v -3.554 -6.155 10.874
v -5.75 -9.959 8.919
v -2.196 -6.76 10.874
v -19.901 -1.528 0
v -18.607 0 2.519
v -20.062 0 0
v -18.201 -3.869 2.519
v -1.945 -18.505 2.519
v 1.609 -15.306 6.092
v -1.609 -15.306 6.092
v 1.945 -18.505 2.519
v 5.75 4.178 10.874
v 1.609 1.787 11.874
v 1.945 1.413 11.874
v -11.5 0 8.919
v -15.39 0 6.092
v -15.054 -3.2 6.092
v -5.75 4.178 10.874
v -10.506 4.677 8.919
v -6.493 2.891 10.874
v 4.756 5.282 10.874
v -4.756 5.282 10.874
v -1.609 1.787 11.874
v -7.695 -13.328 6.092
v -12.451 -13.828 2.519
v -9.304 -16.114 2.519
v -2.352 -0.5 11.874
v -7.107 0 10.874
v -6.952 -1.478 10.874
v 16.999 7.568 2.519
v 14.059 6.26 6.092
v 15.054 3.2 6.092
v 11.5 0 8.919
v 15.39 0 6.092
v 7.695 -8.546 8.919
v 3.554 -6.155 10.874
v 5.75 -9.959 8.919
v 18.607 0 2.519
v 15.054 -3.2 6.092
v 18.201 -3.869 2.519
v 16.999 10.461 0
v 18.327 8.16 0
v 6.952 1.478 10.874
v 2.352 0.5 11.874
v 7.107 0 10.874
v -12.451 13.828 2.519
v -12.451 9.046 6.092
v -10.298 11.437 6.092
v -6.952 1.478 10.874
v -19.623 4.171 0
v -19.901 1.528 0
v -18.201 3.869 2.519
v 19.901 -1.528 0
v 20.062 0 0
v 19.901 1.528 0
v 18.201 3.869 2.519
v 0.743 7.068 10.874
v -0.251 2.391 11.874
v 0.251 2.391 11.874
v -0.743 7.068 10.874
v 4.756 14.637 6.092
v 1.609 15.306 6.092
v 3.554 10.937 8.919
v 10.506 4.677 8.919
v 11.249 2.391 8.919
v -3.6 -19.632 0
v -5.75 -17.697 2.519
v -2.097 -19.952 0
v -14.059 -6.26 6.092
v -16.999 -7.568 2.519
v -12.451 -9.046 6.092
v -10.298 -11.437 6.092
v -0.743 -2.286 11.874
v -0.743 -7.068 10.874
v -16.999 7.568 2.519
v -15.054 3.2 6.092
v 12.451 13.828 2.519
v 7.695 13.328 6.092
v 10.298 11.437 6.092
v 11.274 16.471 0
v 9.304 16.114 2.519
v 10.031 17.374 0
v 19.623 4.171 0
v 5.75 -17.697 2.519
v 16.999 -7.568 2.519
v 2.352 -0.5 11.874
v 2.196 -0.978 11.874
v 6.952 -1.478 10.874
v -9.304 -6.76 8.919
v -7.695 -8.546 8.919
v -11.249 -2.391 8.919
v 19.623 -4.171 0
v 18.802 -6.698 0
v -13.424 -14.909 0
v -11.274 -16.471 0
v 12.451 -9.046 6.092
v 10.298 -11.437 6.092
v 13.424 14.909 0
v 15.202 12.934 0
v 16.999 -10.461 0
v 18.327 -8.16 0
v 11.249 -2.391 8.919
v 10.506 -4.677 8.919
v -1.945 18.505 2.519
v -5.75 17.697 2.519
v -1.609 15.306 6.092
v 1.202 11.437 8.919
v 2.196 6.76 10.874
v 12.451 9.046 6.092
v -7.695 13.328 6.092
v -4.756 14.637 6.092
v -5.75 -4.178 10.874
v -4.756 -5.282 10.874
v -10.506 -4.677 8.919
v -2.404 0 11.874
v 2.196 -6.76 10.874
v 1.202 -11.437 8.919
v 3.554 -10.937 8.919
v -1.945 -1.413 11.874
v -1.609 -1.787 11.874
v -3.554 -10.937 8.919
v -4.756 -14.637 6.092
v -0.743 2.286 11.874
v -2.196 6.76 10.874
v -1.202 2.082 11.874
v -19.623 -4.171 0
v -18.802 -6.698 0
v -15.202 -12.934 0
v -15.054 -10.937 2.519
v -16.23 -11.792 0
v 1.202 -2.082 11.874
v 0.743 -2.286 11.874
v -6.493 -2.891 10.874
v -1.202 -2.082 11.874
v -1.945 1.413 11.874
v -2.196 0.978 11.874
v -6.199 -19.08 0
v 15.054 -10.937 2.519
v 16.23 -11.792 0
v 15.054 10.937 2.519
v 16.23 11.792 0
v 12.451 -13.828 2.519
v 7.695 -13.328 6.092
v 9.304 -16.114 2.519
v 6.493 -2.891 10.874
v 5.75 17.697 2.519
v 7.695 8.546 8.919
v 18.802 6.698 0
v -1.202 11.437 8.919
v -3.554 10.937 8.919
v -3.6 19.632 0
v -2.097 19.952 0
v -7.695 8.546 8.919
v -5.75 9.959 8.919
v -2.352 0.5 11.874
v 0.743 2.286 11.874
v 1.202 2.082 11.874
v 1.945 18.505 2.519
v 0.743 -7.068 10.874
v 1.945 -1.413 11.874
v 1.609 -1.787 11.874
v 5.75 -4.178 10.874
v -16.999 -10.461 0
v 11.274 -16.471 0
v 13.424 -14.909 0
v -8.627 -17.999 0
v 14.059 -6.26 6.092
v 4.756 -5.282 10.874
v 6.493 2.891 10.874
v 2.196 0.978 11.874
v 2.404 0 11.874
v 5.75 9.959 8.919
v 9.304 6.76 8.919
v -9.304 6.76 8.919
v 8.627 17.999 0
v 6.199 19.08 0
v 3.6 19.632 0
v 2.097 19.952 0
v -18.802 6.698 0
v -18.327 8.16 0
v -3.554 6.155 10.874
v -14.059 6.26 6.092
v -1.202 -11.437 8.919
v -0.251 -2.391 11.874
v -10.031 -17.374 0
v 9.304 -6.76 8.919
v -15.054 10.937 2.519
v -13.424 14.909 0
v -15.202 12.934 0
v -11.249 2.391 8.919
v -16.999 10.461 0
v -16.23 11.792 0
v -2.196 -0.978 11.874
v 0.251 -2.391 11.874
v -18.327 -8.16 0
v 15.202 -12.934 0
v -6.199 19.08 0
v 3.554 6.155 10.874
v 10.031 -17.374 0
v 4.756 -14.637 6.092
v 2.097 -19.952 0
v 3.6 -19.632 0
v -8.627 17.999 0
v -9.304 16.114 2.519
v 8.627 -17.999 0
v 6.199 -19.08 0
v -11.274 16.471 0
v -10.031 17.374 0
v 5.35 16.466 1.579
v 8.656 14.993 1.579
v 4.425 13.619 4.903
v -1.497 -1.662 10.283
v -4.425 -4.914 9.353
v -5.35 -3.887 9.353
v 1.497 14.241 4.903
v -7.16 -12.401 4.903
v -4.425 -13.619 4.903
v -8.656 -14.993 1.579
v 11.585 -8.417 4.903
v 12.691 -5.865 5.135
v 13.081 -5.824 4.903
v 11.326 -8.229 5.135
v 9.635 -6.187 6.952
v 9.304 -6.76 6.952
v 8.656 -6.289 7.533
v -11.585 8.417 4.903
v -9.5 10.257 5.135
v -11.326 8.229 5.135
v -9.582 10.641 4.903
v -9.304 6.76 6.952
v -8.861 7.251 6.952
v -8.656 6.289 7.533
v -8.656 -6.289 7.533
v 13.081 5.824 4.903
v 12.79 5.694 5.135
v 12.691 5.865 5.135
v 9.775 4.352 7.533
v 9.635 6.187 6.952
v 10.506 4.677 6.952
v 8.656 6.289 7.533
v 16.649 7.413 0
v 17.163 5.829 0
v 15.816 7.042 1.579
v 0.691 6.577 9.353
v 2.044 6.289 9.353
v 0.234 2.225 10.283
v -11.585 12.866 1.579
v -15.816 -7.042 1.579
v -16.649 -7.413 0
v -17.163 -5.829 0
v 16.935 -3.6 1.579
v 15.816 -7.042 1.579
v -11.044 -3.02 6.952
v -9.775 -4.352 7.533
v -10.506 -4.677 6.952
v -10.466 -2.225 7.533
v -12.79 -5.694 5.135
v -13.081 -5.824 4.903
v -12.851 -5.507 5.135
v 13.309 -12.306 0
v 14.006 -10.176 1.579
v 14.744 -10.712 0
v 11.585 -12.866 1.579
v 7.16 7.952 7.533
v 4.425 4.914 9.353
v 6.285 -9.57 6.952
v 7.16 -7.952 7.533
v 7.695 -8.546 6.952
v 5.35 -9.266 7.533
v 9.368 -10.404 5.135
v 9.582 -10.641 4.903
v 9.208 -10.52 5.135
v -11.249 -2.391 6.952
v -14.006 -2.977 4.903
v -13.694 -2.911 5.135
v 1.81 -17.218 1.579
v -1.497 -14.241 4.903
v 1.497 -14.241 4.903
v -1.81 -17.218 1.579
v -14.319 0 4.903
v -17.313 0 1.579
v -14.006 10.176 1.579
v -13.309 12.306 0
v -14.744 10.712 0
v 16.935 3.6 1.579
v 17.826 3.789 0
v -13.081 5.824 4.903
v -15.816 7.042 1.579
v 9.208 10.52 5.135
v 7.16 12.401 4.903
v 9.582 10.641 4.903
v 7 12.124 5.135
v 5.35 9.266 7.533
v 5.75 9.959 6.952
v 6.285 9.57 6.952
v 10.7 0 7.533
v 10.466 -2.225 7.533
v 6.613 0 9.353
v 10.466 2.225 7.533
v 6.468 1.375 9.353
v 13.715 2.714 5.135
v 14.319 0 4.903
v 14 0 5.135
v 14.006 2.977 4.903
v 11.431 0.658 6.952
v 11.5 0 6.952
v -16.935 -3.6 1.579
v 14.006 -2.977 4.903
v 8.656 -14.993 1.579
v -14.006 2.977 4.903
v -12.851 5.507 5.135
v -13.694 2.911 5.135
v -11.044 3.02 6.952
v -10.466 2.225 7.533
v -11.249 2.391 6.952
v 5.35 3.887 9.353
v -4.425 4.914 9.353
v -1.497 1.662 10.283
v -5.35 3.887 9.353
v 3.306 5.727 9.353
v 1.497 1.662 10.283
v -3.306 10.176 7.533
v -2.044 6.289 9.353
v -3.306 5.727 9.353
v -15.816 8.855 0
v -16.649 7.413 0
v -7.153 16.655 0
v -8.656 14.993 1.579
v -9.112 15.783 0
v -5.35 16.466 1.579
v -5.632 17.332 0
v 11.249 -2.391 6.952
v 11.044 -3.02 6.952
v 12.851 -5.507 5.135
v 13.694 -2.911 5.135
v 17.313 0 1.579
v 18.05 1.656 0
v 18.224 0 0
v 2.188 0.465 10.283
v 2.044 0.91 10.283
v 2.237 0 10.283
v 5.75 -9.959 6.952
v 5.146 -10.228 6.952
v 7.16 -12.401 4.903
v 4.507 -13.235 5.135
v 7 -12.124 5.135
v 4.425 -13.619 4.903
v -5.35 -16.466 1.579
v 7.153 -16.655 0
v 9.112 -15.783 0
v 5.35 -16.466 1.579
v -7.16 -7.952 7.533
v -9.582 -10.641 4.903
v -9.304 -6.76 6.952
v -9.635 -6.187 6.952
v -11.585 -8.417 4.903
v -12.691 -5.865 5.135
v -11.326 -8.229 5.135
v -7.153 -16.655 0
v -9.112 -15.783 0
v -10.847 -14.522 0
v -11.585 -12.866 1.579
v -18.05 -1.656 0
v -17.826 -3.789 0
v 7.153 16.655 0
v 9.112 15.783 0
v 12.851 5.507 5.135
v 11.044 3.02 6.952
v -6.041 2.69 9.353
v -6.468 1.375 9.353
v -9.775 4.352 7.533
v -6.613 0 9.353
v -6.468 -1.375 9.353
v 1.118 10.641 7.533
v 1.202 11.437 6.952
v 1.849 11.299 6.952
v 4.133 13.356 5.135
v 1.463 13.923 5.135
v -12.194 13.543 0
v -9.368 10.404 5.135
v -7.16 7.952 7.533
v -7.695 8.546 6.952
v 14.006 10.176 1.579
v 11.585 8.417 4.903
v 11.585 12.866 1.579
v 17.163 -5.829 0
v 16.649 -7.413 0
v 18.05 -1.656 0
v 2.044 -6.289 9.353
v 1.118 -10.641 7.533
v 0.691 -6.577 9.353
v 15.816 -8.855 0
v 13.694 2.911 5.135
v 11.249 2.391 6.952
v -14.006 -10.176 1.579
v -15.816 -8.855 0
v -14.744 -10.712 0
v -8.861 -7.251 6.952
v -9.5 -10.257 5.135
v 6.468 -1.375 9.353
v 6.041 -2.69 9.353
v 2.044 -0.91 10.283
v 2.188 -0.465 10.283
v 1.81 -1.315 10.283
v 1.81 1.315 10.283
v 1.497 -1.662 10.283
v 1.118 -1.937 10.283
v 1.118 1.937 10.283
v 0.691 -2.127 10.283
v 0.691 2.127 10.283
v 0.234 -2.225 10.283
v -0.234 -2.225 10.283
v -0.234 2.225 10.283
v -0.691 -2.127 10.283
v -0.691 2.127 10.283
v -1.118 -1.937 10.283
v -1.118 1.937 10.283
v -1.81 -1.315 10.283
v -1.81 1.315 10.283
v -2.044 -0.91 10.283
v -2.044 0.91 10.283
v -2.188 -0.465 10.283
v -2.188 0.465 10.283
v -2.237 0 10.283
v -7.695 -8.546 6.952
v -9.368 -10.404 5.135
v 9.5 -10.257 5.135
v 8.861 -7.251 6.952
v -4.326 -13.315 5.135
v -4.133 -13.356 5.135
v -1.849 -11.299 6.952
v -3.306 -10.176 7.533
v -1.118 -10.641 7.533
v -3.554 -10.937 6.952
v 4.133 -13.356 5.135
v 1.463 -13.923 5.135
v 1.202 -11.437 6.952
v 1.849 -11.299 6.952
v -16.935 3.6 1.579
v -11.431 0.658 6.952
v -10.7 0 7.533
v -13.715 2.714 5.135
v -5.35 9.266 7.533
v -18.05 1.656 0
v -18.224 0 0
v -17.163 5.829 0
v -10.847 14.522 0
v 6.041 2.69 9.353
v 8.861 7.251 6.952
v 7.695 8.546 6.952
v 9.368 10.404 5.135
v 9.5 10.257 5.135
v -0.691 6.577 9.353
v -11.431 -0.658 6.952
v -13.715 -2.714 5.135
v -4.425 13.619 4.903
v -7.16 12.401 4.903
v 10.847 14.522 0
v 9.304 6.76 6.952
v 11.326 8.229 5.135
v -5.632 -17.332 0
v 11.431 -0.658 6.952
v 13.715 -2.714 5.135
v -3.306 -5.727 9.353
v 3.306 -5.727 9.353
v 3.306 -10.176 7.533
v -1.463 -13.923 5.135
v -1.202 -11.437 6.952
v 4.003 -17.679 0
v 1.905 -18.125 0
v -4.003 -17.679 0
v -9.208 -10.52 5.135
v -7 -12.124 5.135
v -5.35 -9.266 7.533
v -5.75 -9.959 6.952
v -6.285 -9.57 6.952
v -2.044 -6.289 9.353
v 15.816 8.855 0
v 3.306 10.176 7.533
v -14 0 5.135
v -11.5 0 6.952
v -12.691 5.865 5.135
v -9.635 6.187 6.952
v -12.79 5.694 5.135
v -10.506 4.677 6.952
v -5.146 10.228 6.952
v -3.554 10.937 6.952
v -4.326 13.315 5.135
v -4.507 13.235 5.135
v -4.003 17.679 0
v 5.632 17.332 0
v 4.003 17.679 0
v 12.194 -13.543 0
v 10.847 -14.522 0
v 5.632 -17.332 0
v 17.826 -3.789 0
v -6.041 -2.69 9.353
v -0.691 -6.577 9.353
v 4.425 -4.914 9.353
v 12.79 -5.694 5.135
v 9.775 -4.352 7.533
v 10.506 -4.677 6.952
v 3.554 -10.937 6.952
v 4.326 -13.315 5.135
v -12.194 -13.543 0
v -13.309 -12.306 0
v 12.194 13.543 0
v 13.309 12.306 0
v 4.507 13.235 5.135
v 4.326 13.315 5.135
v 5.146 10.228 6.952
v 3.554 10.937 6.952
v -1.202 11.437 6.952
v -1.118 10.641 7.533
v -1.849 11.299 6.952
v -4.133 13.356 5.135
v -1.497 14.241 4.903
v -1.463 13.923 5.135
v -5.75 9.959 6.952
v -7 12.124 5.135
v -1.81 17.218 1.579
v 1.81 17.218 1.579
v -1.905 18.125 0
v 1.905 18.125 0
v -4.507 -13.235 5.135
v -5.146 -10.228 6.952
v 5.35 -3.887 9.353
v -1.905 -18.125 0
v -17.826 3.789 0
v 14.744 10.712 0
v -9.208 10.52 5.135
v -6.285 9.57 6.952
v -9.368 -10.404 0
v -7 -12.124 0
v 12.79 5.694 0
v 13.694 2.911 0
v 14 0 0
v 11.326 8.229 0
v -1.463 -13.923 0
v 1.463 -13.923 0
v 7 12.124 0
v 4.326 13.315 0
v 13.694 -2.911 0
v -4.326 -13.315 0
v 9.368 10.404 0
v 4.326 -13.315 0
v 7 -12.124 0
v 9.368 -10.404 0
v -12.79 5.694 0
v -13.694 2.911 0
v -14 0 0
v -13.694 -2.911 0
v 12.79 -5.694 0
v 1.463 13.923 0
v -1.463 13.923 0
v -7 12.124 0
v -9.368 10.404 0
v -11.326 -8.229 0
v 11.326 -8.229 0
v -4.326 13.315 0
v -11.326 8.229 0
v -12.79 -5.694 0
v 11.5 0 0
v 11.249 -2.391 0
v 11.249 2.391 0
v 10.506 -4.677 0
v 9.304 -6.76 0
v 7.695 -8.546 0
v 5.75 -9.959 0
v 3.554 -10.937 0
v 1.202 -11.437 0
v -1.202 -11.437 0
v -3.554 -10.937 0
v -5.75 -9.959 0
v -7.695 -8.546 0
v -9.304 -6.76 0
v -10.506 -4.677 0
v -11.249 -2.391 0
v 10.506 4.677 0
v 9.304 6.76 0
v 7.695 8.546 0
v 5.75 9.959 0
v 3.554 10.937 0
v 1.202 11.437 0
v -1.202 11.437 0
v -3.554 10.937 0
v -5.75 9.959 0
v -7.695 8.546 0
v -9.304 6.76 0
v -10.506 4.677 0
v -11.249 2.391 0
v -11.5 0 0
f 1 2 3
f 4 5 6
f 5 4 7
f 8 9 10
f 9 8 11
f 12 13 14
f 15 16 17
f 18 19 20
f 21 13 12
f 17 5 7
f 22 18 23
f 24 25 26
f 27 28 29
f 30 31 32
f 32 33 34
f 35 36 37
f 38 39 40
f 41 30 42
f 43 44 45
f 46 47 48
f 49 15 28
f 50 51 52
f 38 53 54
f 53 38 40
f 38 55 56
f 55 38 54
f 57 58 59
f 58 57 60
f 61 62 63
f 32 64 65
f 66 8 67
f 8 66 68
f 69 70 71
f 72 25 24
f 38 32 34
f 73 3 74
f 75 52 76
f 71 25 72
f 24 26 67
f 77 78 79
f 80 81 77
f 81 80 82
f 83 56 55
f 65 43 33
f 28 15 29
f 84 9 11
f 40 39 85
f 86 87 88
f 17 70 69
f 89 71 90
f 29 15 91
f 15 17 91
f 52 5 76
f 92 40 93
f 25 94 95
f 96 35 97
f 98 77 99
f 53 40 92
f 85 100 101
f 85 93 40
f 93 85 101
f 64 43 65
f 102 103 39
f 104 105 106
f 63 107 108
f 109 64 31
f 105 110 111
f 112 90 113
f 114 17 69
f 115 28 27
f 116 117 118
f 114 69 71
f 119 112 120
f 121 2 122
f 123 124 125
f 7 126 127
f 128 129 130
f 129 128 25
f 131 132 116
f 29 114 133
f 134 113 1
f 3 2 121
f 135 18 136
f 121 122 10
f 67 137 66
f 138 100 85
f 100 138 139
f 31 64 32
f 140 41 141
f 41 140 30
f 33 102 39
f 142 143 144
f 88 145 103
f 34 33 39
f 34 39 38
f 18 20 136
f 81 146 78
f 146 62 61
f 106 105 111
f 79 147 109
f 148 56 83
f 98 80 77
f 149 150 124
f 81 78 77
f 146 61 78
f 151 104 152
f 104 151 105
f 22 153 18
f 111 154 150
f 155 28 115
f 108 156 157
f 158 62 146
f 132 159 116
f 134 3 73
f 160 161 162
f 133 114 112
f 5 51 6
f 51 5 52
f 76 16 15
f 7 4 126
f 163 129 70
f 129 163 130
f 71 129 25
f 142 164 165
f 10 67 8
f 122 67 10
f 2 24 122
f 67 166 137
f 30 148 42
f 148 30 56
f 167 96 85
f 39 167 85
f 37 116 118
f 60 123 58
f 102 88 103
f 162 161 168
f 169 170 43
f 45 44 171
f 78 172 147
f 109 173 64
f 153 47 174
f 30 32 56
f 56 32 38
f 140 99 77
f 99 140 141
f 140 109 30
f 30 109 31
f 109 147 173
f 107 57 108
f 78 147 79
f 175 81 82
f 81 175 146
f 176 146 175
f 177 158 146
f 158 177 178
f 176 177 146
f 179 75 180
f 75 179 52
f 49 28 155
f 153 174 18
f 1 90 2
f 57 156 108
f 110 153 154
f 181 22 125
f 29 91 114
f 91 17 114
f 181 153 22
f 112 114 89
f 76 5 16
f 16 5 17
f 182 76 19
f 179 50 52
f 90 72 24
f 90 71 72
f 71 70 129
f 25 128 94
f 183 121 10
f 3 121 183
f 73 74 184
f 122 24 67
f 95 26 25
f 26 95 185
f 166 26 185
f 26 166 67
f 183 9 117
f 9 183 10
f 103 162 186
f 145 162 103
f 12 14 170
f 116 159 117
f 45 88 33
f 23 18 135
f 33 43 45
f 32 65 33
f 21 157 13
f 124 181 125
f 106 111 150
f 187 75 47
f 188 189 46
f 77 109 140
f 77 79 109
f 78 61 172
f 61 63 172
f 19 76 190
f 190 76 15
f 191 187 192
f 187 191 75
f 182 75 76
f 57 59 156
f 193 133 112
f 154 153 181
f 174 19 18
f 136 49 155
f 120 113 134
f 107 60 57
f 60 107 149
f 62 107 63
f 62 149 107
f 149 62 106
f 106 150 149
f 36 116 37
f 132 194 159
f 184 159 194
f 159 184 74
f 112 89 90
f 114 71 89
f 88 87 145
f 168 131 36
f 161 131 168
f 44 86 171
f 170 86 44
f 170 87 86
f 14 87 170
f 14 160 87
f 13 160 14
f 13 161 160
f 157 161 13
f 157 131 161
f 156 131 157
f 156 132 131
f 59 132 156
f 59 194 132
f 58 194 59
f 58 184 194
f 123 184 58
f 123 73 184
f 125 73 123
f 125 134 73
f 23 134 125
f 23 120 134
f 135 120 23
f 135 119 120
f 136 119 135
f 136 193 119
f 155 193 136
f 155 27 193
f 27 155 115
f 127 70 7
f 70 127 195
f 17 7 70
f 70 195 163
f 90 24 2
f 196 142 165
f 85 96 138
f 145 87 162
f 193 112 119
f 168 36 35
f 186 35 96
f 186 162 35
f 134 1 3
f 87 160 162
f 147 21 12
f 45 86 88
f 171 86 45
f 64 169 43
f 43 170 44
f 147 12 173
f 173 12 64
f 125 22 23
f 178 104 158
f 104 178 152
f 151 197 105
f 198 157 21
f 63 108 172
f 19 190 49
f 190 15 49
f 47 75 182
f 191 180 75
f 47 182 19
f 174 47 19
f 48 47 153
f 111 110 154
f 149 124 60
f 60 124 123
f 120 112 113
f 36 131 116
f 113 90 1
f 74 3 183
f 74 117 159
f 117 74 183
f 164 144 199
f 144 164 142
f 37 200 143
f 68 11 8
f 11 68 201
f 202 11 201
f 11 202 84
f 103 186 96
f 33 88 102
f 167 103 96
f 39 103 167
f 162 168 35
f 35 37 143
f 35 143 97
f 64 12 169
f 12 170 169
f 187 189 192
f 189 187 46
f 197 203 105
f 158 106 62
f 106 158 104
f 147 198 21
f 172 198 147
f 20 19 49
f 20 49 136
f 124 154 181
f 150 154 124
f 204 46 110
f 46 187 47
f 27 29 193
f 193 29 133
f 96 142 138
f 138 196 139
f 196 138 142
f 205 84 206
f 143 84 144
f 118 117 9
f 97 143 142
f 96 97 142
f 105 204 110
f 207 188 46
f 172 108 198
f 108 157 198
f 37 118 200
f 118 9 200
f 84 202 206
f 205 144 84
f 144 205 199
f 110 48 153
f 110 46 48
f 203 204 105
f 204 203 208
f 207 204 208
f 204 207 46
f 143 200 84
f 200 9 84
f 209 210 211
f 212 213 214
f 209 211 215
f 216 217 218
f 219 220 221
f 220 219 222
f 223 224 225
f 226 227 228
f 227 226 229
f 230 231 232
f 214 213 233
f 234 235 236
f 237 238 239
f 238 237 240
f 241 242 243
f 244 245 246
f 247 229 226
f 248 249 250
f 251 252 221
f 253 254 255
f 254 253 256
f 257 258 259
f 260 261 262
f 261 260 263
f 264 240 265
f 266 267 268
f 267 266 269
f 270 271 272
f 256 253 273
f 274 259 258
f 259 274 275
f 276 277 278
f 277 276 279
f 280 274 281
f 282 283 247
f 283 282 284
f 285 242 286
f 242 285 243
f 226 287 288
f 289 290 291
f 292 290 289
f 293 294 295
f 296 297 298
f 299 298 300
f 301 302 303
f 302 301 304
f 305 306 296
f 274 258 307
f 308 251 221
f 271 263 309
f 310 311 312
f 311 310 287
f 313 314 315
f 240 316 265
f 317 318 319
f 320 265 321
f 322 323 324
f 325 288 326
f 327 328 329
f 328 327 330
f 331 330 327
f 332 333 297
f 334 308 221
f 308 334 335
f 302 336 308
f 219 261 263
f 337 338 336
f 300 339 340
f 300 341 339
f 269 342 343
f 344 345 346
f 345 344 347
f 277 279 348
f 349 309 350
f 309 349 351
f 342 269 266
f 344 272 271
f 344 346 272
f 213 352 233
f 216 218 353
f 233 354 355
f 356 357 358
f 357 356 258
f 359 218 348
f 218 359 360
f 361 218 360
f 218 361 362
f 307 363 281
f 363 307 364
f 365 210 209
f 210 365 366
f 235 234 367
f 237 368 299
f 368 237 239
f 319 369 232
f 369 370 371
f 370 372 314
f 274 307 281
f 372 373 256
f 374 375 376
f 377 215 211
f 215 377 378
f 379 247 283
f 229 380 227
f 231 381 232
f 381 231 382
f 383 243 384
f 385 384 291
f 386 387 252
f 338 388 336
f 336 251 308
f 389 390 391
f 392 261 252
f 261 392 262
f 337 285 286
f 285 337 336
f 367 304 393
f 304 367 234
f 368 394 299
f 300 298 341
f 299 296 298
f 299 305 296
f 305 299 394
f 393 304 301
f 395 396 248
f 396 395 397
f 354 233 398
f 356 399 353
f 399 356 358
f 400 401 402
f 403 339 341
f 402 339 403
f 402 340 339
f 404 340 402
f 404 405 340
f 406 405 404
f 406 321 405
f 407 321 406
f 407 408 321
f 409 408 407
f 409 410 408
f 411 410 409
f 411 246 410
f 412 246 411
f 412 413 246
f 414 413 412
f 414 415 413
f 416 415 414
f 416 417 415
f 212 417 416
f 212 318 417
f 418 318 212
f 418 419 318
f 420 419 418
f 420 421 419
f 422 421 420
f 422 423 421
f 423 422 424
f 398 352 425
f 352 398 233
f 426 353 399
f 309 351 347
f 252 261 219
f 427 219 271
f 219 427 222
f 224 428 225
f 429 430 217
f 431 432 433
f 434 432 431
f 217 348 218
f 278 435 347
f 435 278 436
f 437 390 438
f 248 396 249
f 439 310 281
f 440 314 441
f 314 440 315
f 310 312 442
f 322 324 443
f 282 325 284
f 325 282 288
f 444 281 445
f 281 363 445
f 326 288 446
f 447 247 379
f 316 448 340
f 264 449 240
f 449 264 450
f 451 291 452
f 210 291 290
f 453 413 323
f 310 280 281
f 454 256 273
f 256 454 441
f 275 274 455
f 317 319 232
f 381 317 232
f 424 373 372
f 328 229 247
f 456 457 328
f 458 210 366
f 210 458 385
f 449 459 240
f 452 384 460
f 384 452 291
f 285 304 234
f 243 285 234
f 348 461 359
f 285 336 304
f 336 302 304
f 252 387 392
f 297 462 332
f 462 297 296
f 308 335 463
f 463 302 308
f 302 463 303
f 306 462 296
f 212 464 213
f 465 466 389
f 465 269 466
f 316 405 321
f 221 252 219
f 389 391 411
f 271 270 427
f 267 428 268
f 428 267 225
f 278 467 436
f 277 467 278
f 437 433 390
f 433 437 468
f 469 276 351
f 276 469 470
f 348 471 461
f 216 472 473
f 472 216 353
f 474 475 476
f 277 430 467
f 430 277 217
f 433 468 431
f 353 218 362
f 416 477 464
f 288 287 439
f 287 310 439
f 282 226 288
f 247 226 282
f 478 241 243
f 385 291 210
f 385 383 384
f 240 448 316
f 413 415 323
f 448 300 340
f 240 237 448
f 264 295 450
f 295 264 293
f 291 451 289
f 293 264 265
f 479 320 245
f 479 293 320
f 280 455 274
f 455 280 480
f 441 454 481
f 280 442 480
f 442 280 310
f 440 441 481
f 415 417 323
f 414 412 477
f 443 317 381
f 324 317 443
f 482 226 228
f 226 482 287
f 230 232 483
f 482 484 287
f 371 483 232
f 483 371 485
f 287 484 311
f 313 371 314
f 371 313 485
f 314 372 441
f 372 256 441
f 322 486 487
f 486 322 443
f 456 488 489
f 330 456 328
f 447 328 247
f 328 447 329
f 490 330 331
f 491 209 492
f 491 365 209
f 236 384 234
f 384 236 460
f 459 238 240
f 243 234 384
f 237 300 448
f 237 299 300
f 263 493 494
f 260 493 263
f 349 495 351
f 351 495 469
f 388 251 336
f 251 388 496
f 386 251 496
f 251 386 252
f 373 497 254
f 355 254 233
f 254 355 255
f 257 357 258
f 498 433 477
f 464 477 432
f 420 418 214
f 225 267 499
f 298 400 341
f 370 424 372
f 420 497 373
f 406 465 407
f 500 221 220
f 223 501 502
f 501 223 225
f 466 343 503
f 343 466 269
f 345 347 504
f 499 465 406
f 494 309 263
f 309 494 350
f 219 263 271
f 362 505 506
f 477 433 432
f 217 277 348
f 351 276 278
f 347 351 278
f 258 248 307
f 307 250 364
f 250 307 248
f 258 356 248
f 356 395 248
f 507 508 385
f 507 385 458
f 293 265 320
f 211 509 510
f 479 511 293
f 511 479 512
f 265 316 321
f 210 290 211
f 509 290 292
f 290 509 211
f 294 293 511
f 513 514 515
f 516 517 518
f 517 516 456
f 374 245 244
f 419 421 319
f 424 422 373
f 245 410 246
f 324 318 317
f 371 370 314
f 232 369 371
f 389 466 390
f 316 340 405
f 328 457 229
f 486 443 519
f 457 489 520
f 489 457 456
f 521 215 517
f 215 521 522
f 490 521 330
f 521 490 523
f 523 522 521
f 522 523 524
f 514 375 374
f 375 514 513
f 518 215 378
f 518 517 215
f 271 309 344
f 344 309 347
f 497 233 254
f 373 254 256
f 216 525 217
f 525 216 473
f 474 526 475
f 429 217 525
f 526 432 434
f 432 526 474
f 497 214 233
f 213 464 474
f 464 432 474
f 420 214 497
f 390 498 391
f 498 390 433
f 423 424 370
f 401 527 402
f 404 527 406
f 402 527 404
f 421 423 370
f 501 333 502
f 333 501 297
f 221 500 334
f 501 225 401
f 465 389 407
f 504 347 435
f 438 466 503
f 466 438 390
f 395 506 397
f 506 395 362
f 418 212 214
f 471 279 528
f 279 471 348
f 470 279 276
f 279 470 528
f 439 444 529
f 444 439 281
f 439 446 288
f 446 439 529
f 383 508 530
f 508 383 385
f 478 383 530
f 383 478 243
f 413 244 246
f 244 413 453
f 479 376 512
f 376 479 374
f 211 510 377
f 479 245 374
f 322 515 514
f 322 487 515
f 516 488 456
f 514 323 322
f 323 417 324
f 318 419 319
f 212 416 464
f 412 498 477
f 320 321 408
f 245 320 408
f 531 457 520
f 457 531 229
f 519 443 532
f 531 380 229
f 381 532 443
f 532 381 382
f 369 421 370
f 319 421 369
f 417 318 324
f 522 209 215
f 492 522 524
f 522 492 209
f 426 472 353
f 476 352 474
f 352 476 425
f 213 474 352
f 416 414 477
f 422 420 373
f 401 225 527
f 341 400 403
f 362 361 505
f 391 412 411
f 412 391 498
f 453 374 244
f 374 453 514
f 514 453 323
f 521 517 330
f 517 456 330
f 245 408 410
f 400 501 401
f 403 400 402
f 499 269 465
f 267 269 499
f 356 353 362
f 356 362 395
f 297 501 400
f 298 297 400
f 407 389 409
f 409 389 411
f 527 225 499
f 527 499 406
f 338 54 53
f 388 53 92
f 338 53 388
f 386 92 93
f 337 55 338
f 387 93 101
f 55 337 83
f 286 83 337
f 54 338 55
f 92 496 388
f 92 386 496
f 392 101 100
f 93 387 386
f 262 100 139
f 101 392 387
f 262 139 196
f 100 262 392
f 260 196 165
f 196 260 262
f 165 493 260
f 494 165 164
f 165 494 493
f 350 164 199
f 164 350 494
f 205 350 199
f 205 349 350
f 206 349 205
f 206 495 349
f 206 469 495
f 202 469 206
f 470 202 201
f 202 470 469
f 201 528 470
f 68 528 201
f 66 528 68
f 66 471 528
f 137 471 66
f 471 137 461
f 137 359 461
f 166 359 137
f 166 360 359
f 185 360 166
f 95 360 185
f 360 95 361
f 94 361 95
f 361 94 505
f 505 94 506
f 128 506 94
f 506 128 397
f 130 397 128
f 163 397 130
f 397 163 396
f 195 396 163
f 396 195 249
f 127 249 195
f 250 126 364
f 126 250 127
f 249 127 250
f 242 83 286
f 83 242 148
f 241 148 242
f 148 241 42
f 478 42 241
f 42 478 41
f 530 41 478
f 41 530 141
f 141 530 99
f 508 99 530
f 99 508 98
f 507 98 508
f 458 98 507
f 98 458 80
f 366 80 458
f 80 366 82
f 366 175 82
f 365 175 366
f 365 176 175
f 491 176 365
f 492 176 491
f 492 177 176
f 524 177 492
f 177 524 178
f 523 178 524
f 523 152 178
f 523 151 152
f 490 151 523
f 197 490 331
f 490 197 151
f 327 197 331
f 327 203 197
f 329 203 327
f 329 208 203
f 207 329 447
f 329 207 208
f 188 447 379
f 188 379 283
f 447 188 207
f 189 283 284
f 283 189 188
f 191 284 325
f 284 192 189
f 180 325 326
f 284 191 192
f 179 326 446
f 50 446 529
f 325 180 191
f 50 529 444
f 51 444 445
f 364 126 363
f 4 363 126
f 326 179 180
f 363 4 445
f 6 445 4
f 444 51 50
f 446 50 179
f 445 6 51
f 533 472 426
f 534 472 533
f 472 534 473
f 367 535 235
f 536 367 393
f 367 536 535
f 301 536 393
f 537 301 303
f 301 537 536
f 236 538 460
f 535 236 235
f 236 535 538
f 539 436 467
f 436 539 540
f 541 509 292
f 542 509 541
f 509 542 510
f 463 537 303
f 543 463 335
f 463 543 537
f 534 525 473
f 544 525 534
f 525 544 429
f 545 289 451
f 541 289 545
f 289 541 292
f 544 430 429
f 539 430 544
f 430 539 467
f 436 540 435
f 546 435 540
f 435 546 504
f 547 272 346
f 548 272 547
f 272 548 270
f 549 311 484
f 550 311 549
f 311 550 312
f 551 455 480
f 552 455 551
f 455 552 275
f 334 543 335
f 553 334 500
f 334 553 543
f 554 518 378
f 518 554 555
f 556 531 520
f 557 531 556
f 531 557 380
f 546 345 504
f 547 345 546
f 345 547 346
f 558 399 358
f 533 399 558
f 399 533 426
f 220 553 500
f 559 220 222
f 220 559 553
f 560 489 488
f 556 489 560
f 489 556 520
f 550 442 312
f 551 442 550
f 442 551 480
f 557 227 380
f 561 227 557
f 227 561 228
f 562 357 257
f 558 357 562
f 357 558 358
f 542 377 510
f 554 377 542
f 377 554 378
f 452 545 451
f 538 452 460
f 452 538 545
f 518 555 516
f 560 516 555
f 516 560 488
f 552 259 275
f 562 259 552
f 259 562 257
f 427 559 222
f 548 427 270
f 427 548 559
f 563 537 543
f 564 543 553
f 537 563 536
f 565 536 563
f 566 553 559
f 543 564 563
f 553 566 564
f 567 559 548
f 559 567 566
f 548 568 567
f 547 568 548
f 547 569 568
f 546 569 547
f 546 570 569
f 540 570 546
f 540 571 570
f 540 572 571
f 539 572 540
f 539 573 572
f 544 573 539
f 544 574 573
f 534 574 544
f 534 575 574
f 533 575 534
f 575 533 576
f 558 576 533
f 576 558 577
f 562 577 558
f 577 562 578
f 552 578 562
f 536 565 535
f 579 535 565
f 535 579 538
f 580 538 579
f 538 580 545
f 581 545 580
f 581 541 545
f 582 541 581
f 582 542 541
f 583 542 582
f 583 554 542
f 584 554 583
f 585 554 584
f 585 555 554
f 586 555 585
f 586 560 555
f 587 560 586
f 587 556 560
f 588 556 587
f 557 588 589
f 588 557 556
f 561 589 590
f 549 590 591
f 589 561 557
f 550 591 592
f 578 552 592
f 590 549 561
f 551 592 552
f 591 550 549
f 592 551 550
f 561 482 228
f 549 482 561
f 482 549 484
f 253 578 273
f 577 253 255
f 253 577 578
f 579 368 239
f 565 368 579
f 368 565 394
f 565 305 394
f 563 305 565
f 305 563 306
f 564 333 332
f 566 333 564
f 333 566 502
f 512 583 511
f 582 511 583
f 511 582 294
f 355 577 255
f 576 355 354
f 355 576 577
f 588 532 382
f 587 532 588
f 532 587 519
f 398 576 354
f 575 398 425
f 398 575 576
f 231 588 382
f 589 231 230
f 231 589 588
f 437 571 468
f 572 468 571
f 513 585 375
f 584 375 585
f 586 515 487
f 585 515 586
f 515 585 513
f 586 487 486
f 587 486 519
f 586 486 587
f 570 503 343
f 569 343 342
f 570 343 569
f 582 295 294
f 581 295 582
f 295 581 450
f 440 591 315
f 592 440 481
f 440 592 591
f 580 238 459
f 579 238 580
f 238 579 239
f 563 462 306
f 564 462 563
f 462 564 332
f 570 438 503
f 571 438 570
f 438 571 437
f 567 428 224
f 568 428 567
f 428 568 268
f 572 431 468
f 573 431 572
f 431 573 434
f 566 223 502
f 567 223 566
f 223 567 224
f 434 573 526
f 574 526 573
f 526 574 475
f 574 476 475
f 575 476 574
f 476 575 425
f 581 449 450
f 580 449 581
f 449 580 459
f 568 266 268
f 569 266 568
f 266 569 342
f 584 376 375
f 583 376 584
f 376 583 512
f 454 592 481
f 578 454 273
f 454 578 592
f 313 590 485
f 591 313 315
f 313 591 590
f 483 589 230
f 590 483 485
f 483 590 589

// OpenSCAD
//$fn=200;
union(){

difference(){
    translate([0,0,-11])
    sphere(r=23);
    translate([0,0,-11])
    sphere(r=23-1.6);
    
    translate([0,0,-30])
        cylinder(r=60, h=60,center=true);
}

difference(){
    cylinder(d=28, h=7);
    cylinder(d=23, h=7.01);
}
}
